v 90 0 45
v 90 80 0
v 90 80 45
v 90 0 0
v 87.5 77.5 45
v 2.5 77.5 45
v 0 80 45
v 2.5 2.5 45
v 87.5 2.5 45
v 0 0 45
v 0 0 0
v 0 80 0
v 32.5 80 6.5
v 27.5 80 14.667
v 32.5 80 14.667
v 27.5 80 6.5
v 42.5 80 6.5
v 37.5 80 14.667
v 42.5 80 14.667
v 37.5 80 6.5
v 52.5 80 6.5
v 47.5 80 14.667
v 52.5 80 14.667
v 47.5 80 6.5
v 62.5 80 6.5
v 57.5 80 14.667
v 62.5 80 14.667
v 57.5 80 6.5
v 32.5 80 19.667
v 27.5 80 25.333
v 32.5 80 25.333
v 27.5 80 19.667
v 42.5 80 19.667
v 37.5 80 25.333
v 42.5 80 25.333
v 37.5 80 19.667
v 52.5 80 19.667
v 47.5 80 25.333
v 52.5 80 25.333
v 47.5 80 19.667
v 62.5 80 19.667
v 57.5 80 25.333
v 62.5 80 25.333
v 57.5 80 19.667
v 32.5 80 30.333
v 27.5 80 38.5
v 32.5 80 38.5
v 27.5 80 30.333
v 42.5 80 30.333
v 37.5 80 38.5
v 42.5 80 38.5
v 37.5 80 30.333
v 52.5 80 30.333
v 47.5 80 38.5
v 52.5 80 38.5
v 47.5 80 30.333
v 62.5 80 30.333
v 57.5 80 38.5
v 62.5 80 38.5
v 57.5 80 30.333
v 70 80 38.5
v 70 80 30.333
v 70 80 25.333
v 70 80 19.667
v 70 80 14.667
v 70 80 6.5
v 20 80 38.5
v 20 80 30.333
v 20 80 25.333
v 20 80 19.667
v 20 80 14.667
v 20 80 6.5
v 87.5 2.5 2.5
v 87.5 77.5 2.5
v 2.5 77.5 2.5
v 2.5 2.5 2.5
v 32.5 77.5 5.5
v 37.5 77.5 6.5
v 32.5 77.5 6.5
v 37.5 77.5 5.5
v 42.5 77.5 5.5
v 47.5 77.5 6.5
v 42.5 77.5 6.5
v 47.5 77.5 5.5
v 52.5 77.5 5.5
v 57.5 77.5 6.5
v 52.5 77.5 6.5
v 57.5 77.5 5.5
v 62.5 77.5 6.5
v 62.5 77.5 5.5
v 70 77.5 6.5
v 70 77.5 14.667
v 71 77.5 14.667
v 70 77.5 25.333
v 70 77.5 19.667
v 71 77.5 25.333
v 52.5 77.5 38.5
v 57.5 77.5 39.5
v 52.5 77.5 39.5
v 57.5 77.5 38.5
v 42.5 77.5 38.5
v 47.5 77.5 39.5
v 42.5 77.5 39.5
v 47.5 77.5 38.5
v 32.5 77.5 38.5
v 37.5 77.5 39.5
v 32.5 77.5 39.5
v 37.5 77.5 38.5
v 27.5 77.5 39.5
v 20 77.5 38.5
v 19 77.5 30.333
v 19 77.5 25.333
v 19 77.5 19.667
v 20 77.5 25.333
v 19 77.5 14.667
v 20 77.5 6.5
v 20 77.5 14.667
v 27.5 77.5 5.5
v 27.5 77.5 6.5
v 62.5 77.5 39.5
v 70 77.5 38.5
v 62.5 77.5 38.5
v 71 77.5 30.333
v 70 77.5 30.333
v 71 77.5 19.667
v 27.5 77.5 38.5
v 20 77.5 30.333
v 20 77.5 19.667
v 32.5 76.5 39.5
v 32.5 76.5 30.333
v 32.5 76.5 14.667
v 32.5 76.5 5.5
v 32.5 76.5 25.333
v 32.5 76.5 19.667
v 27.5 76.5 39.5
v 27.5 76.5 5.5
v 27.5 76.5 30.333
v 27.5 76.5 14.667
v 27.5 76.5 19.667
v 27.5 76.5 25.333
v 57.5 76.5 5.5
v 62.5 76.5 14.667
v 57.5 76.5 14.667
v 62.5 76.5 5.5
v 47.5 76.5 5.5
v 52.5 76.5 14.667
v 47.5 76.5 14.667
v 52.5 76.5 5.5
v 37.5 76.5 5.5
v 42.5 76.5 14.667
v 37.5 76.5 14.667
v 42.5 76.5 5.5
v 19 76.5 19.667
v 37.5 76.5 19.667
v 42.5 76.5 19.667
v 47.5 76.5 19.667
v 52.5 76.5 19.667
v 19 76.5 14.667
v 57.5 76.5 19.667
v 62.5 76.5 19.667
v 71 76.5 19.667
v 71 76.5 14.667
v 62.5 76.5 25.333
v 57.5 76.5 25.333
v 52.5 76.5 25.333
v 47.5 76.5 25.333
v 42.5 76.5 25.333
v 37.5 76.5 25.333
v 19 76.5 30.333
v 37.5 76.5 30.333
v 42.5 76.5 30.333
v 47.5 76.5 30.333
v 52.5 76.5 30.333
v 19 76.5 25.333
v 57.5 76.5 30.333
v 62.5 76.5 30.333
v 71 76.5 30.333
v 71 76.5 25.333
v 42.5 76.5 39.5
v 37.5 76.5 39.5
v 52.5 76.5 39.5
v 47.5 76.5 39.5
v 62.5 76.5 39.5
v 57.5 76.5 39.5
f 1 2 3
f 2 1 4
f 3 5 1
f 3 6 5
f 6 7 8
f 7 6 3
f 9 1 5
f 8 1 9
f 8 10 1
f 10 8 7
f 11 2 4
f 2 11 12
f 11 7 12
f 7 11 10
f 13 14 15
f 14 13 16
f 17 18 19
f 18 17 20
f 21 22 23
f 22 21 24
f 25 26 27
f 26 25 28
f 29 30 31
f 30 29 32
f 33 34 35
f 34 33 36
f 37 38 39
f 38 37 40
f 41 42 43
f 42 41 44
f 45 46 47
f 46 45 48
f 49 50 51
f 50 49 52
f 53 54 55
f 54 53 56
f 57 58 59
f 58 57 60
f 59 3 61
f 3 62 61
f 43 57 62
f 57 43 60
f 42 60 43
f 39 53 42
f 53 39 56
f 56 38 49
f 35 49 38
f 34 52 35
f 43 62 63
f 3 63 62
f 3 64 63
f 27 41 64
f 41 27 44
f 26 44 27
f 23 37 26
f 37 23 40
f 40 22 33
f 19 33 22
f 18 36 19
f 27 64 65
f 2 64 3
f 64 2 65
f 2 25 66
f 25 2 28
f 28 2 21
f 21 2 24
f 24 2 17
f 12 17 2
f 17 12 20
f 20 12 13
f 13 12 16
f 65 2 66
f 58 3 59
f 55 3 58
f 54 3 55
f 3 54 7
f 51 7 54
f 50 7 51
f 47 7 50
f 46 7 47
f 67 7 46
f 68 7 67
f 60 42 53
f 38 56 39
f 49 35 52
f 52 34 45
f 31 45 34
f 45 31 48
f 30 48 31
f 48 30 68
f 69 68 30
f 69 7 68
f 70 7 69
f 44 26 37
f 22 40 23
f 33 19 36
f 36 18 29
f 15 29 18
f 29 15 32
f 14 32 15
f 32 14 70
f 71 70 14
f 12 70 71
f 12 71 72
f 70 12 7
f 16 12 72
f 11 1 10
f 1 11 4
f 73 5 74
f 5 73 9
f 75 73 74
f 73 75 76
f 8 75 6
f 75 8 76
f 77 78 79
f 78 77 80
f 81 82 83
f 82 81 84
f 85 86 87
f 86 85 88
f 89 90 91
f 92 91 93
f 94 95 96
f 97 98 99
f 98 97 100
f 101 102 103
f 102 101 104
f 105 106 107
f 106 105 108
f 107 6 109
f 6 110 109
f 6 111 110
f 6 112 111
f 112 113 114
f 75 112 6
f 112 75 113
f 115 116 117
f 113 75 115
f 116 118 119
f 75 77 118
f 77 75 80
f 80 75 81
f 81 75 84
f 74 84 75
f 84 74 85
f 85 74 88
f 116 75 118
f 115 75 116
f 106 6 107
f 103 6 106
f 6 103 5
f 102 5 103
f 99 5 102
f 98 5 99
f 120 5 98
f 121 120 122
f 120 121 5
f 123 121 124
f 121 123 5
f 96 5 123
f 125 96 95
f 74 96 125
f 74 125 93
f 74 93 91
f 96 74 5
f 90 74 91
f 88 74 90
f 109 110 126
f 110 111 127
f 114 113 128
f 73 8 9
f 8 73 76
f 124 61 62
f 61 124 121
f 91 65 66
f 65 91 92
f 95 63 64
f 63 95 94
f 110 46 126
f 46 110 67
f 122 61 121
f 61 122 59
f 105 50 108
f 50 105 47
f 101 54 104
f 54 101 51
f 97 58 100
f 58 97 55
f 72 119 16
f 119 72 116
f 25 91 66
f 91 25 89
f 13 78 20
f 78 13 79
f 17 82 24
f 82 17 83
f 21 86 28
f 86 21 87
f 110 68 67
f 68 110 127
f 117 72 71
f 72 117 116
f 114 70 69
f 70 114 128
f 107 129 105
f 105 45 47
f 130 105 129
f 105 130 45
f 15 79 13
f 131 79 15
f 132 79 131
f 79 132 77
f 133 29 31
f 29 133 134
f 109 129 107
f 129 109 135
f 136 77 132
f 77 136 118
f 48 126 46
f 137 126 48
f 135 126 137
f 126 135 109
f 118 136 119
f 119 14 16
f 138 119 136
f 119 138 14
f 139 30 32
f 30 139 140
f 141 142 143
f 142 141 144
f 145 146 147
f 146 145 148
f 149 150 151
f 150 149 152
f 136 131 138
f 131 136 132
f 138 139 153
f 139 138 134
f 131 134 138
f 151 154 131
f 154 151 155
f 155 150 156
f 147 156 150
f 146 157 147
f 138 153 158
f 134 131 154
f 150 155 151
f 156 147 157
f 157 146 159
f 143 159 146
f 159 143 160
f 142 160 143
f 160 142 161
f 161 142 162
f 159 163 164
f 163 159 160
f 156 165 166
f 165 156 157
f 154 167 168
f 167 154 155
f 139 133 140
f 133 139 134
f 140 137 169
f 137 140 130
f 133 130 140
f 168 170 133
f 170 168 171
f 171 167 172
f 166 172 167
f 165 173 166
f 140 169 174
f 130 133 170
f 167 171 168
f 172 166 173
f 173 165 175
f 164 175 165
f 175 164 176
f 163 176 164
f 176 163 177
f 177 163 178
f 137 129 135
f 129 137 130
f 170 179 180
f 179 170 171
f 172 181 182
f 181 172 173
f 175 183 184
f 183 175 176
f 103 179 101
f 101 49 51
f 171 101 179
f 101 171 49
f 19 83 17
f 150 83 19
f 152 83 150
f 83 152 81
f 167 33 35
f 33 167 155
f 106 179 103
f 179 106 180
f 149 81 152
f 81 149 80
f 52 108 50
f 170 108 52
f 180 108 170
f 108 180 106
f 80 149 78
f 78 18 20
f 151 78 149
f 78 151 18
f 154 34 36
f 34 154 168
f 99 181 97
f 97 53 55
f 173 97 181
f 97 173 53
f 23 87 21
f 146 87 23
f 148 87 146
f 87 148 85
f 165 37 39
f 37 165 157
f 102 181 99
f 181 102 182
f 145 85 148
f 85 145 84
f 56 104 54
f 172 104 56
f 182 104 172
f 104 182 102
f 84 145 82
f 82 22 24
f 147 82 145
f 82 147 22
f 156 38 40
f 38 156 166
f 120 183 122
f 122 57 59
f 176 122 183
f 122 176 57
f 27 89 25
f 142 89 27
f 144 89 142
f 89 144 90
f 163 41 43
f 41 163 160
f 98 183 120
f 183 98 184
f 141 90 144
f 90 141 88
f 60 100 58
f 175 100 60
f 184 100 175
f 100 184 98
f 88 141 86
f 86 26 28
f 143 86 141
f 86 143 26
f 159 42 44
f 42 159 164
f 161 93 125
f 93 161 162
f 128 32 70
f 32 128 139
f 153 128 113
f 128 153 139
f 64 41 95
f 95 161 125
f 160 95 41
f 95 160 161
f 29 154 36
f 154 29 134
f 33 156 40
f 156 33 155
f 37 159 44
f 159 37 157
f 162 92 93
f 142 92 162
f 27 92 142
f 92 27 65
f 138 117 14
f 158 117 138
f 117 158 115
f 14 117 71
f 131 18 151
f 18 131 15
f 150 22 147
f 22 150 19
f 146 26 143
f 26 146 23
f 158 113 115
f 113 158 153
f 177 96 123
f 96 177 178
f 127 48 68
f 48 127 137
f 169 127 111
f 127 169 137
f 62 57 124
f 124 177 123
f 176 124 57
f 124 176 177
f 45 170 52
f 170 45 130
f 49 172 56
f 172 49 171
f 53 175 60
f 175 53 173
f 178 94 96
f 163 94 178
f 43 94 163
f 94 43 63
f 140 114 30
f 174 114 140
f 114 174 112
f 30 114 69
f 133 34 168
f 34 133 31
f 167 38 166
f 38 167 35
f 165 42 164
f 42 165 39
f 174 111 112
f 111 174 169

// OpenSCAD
$fn = 32;

// ----------------------------------------------------------------------
// Vent box: crossgrid enclosure
// ----------------------------------------------------------------------

// --- parameters (mm) ---
box_l = 90;               // box length, X
box_w = 80;               // box width, Y
box_h = 45;               // box height, Z
wall_t = 2.5;             // shell wall thickness
win_l = 50;               // vent window width, X
win_h = 32;               // vent window height, Z
bar_w = 5;                // grid bar width
n_v = 4;                  // vertical bar count
n_h = 2;                  // horizontal bar count
fit_tol = 0.1;            // tolerance for press fits, mm
free_tol = 0.5;           // tolerance for clearance fits, mm

win_z0 = (box_h - win_h) / 2;  // window lower edge Z
v_step = win_l / (n_v + 1);  // vertical bar step
h_step = win_h / (n_h + 1);  // horizontal bar step

difference() {
  union() {
    difference() {
      cube([box_l, box_w, box_h]);
  translate([wall_t, wall_t, wall_t])
    cube([box_l - 2 * wall_t, box_w - 2 * wall_t, box_h]);
  translate([(box_l - win_l) / 2, box_w - wall_t - 1, win_z0])
    cube([win_l, wall_t + 2, win_h]);
    }
    for (i = [1 : n_v])
      translate([(box_l - win_l) / 2 + i * v_step - bar_w / 2,
                 box_w - wall_t - 1, win_z0 - 1])
        cube([bar_w, wall_t + 1, win_h + 2]);
    for (i = [1 : n_h])
      translate([(box_l - win_l) / 2 - 1, box_w - wall_t - 1,
                 win_z0 + i * h_step - bar_w / 2])
        cube([win_l + 2, wall_t + 1, bar_w]);
  }
}
